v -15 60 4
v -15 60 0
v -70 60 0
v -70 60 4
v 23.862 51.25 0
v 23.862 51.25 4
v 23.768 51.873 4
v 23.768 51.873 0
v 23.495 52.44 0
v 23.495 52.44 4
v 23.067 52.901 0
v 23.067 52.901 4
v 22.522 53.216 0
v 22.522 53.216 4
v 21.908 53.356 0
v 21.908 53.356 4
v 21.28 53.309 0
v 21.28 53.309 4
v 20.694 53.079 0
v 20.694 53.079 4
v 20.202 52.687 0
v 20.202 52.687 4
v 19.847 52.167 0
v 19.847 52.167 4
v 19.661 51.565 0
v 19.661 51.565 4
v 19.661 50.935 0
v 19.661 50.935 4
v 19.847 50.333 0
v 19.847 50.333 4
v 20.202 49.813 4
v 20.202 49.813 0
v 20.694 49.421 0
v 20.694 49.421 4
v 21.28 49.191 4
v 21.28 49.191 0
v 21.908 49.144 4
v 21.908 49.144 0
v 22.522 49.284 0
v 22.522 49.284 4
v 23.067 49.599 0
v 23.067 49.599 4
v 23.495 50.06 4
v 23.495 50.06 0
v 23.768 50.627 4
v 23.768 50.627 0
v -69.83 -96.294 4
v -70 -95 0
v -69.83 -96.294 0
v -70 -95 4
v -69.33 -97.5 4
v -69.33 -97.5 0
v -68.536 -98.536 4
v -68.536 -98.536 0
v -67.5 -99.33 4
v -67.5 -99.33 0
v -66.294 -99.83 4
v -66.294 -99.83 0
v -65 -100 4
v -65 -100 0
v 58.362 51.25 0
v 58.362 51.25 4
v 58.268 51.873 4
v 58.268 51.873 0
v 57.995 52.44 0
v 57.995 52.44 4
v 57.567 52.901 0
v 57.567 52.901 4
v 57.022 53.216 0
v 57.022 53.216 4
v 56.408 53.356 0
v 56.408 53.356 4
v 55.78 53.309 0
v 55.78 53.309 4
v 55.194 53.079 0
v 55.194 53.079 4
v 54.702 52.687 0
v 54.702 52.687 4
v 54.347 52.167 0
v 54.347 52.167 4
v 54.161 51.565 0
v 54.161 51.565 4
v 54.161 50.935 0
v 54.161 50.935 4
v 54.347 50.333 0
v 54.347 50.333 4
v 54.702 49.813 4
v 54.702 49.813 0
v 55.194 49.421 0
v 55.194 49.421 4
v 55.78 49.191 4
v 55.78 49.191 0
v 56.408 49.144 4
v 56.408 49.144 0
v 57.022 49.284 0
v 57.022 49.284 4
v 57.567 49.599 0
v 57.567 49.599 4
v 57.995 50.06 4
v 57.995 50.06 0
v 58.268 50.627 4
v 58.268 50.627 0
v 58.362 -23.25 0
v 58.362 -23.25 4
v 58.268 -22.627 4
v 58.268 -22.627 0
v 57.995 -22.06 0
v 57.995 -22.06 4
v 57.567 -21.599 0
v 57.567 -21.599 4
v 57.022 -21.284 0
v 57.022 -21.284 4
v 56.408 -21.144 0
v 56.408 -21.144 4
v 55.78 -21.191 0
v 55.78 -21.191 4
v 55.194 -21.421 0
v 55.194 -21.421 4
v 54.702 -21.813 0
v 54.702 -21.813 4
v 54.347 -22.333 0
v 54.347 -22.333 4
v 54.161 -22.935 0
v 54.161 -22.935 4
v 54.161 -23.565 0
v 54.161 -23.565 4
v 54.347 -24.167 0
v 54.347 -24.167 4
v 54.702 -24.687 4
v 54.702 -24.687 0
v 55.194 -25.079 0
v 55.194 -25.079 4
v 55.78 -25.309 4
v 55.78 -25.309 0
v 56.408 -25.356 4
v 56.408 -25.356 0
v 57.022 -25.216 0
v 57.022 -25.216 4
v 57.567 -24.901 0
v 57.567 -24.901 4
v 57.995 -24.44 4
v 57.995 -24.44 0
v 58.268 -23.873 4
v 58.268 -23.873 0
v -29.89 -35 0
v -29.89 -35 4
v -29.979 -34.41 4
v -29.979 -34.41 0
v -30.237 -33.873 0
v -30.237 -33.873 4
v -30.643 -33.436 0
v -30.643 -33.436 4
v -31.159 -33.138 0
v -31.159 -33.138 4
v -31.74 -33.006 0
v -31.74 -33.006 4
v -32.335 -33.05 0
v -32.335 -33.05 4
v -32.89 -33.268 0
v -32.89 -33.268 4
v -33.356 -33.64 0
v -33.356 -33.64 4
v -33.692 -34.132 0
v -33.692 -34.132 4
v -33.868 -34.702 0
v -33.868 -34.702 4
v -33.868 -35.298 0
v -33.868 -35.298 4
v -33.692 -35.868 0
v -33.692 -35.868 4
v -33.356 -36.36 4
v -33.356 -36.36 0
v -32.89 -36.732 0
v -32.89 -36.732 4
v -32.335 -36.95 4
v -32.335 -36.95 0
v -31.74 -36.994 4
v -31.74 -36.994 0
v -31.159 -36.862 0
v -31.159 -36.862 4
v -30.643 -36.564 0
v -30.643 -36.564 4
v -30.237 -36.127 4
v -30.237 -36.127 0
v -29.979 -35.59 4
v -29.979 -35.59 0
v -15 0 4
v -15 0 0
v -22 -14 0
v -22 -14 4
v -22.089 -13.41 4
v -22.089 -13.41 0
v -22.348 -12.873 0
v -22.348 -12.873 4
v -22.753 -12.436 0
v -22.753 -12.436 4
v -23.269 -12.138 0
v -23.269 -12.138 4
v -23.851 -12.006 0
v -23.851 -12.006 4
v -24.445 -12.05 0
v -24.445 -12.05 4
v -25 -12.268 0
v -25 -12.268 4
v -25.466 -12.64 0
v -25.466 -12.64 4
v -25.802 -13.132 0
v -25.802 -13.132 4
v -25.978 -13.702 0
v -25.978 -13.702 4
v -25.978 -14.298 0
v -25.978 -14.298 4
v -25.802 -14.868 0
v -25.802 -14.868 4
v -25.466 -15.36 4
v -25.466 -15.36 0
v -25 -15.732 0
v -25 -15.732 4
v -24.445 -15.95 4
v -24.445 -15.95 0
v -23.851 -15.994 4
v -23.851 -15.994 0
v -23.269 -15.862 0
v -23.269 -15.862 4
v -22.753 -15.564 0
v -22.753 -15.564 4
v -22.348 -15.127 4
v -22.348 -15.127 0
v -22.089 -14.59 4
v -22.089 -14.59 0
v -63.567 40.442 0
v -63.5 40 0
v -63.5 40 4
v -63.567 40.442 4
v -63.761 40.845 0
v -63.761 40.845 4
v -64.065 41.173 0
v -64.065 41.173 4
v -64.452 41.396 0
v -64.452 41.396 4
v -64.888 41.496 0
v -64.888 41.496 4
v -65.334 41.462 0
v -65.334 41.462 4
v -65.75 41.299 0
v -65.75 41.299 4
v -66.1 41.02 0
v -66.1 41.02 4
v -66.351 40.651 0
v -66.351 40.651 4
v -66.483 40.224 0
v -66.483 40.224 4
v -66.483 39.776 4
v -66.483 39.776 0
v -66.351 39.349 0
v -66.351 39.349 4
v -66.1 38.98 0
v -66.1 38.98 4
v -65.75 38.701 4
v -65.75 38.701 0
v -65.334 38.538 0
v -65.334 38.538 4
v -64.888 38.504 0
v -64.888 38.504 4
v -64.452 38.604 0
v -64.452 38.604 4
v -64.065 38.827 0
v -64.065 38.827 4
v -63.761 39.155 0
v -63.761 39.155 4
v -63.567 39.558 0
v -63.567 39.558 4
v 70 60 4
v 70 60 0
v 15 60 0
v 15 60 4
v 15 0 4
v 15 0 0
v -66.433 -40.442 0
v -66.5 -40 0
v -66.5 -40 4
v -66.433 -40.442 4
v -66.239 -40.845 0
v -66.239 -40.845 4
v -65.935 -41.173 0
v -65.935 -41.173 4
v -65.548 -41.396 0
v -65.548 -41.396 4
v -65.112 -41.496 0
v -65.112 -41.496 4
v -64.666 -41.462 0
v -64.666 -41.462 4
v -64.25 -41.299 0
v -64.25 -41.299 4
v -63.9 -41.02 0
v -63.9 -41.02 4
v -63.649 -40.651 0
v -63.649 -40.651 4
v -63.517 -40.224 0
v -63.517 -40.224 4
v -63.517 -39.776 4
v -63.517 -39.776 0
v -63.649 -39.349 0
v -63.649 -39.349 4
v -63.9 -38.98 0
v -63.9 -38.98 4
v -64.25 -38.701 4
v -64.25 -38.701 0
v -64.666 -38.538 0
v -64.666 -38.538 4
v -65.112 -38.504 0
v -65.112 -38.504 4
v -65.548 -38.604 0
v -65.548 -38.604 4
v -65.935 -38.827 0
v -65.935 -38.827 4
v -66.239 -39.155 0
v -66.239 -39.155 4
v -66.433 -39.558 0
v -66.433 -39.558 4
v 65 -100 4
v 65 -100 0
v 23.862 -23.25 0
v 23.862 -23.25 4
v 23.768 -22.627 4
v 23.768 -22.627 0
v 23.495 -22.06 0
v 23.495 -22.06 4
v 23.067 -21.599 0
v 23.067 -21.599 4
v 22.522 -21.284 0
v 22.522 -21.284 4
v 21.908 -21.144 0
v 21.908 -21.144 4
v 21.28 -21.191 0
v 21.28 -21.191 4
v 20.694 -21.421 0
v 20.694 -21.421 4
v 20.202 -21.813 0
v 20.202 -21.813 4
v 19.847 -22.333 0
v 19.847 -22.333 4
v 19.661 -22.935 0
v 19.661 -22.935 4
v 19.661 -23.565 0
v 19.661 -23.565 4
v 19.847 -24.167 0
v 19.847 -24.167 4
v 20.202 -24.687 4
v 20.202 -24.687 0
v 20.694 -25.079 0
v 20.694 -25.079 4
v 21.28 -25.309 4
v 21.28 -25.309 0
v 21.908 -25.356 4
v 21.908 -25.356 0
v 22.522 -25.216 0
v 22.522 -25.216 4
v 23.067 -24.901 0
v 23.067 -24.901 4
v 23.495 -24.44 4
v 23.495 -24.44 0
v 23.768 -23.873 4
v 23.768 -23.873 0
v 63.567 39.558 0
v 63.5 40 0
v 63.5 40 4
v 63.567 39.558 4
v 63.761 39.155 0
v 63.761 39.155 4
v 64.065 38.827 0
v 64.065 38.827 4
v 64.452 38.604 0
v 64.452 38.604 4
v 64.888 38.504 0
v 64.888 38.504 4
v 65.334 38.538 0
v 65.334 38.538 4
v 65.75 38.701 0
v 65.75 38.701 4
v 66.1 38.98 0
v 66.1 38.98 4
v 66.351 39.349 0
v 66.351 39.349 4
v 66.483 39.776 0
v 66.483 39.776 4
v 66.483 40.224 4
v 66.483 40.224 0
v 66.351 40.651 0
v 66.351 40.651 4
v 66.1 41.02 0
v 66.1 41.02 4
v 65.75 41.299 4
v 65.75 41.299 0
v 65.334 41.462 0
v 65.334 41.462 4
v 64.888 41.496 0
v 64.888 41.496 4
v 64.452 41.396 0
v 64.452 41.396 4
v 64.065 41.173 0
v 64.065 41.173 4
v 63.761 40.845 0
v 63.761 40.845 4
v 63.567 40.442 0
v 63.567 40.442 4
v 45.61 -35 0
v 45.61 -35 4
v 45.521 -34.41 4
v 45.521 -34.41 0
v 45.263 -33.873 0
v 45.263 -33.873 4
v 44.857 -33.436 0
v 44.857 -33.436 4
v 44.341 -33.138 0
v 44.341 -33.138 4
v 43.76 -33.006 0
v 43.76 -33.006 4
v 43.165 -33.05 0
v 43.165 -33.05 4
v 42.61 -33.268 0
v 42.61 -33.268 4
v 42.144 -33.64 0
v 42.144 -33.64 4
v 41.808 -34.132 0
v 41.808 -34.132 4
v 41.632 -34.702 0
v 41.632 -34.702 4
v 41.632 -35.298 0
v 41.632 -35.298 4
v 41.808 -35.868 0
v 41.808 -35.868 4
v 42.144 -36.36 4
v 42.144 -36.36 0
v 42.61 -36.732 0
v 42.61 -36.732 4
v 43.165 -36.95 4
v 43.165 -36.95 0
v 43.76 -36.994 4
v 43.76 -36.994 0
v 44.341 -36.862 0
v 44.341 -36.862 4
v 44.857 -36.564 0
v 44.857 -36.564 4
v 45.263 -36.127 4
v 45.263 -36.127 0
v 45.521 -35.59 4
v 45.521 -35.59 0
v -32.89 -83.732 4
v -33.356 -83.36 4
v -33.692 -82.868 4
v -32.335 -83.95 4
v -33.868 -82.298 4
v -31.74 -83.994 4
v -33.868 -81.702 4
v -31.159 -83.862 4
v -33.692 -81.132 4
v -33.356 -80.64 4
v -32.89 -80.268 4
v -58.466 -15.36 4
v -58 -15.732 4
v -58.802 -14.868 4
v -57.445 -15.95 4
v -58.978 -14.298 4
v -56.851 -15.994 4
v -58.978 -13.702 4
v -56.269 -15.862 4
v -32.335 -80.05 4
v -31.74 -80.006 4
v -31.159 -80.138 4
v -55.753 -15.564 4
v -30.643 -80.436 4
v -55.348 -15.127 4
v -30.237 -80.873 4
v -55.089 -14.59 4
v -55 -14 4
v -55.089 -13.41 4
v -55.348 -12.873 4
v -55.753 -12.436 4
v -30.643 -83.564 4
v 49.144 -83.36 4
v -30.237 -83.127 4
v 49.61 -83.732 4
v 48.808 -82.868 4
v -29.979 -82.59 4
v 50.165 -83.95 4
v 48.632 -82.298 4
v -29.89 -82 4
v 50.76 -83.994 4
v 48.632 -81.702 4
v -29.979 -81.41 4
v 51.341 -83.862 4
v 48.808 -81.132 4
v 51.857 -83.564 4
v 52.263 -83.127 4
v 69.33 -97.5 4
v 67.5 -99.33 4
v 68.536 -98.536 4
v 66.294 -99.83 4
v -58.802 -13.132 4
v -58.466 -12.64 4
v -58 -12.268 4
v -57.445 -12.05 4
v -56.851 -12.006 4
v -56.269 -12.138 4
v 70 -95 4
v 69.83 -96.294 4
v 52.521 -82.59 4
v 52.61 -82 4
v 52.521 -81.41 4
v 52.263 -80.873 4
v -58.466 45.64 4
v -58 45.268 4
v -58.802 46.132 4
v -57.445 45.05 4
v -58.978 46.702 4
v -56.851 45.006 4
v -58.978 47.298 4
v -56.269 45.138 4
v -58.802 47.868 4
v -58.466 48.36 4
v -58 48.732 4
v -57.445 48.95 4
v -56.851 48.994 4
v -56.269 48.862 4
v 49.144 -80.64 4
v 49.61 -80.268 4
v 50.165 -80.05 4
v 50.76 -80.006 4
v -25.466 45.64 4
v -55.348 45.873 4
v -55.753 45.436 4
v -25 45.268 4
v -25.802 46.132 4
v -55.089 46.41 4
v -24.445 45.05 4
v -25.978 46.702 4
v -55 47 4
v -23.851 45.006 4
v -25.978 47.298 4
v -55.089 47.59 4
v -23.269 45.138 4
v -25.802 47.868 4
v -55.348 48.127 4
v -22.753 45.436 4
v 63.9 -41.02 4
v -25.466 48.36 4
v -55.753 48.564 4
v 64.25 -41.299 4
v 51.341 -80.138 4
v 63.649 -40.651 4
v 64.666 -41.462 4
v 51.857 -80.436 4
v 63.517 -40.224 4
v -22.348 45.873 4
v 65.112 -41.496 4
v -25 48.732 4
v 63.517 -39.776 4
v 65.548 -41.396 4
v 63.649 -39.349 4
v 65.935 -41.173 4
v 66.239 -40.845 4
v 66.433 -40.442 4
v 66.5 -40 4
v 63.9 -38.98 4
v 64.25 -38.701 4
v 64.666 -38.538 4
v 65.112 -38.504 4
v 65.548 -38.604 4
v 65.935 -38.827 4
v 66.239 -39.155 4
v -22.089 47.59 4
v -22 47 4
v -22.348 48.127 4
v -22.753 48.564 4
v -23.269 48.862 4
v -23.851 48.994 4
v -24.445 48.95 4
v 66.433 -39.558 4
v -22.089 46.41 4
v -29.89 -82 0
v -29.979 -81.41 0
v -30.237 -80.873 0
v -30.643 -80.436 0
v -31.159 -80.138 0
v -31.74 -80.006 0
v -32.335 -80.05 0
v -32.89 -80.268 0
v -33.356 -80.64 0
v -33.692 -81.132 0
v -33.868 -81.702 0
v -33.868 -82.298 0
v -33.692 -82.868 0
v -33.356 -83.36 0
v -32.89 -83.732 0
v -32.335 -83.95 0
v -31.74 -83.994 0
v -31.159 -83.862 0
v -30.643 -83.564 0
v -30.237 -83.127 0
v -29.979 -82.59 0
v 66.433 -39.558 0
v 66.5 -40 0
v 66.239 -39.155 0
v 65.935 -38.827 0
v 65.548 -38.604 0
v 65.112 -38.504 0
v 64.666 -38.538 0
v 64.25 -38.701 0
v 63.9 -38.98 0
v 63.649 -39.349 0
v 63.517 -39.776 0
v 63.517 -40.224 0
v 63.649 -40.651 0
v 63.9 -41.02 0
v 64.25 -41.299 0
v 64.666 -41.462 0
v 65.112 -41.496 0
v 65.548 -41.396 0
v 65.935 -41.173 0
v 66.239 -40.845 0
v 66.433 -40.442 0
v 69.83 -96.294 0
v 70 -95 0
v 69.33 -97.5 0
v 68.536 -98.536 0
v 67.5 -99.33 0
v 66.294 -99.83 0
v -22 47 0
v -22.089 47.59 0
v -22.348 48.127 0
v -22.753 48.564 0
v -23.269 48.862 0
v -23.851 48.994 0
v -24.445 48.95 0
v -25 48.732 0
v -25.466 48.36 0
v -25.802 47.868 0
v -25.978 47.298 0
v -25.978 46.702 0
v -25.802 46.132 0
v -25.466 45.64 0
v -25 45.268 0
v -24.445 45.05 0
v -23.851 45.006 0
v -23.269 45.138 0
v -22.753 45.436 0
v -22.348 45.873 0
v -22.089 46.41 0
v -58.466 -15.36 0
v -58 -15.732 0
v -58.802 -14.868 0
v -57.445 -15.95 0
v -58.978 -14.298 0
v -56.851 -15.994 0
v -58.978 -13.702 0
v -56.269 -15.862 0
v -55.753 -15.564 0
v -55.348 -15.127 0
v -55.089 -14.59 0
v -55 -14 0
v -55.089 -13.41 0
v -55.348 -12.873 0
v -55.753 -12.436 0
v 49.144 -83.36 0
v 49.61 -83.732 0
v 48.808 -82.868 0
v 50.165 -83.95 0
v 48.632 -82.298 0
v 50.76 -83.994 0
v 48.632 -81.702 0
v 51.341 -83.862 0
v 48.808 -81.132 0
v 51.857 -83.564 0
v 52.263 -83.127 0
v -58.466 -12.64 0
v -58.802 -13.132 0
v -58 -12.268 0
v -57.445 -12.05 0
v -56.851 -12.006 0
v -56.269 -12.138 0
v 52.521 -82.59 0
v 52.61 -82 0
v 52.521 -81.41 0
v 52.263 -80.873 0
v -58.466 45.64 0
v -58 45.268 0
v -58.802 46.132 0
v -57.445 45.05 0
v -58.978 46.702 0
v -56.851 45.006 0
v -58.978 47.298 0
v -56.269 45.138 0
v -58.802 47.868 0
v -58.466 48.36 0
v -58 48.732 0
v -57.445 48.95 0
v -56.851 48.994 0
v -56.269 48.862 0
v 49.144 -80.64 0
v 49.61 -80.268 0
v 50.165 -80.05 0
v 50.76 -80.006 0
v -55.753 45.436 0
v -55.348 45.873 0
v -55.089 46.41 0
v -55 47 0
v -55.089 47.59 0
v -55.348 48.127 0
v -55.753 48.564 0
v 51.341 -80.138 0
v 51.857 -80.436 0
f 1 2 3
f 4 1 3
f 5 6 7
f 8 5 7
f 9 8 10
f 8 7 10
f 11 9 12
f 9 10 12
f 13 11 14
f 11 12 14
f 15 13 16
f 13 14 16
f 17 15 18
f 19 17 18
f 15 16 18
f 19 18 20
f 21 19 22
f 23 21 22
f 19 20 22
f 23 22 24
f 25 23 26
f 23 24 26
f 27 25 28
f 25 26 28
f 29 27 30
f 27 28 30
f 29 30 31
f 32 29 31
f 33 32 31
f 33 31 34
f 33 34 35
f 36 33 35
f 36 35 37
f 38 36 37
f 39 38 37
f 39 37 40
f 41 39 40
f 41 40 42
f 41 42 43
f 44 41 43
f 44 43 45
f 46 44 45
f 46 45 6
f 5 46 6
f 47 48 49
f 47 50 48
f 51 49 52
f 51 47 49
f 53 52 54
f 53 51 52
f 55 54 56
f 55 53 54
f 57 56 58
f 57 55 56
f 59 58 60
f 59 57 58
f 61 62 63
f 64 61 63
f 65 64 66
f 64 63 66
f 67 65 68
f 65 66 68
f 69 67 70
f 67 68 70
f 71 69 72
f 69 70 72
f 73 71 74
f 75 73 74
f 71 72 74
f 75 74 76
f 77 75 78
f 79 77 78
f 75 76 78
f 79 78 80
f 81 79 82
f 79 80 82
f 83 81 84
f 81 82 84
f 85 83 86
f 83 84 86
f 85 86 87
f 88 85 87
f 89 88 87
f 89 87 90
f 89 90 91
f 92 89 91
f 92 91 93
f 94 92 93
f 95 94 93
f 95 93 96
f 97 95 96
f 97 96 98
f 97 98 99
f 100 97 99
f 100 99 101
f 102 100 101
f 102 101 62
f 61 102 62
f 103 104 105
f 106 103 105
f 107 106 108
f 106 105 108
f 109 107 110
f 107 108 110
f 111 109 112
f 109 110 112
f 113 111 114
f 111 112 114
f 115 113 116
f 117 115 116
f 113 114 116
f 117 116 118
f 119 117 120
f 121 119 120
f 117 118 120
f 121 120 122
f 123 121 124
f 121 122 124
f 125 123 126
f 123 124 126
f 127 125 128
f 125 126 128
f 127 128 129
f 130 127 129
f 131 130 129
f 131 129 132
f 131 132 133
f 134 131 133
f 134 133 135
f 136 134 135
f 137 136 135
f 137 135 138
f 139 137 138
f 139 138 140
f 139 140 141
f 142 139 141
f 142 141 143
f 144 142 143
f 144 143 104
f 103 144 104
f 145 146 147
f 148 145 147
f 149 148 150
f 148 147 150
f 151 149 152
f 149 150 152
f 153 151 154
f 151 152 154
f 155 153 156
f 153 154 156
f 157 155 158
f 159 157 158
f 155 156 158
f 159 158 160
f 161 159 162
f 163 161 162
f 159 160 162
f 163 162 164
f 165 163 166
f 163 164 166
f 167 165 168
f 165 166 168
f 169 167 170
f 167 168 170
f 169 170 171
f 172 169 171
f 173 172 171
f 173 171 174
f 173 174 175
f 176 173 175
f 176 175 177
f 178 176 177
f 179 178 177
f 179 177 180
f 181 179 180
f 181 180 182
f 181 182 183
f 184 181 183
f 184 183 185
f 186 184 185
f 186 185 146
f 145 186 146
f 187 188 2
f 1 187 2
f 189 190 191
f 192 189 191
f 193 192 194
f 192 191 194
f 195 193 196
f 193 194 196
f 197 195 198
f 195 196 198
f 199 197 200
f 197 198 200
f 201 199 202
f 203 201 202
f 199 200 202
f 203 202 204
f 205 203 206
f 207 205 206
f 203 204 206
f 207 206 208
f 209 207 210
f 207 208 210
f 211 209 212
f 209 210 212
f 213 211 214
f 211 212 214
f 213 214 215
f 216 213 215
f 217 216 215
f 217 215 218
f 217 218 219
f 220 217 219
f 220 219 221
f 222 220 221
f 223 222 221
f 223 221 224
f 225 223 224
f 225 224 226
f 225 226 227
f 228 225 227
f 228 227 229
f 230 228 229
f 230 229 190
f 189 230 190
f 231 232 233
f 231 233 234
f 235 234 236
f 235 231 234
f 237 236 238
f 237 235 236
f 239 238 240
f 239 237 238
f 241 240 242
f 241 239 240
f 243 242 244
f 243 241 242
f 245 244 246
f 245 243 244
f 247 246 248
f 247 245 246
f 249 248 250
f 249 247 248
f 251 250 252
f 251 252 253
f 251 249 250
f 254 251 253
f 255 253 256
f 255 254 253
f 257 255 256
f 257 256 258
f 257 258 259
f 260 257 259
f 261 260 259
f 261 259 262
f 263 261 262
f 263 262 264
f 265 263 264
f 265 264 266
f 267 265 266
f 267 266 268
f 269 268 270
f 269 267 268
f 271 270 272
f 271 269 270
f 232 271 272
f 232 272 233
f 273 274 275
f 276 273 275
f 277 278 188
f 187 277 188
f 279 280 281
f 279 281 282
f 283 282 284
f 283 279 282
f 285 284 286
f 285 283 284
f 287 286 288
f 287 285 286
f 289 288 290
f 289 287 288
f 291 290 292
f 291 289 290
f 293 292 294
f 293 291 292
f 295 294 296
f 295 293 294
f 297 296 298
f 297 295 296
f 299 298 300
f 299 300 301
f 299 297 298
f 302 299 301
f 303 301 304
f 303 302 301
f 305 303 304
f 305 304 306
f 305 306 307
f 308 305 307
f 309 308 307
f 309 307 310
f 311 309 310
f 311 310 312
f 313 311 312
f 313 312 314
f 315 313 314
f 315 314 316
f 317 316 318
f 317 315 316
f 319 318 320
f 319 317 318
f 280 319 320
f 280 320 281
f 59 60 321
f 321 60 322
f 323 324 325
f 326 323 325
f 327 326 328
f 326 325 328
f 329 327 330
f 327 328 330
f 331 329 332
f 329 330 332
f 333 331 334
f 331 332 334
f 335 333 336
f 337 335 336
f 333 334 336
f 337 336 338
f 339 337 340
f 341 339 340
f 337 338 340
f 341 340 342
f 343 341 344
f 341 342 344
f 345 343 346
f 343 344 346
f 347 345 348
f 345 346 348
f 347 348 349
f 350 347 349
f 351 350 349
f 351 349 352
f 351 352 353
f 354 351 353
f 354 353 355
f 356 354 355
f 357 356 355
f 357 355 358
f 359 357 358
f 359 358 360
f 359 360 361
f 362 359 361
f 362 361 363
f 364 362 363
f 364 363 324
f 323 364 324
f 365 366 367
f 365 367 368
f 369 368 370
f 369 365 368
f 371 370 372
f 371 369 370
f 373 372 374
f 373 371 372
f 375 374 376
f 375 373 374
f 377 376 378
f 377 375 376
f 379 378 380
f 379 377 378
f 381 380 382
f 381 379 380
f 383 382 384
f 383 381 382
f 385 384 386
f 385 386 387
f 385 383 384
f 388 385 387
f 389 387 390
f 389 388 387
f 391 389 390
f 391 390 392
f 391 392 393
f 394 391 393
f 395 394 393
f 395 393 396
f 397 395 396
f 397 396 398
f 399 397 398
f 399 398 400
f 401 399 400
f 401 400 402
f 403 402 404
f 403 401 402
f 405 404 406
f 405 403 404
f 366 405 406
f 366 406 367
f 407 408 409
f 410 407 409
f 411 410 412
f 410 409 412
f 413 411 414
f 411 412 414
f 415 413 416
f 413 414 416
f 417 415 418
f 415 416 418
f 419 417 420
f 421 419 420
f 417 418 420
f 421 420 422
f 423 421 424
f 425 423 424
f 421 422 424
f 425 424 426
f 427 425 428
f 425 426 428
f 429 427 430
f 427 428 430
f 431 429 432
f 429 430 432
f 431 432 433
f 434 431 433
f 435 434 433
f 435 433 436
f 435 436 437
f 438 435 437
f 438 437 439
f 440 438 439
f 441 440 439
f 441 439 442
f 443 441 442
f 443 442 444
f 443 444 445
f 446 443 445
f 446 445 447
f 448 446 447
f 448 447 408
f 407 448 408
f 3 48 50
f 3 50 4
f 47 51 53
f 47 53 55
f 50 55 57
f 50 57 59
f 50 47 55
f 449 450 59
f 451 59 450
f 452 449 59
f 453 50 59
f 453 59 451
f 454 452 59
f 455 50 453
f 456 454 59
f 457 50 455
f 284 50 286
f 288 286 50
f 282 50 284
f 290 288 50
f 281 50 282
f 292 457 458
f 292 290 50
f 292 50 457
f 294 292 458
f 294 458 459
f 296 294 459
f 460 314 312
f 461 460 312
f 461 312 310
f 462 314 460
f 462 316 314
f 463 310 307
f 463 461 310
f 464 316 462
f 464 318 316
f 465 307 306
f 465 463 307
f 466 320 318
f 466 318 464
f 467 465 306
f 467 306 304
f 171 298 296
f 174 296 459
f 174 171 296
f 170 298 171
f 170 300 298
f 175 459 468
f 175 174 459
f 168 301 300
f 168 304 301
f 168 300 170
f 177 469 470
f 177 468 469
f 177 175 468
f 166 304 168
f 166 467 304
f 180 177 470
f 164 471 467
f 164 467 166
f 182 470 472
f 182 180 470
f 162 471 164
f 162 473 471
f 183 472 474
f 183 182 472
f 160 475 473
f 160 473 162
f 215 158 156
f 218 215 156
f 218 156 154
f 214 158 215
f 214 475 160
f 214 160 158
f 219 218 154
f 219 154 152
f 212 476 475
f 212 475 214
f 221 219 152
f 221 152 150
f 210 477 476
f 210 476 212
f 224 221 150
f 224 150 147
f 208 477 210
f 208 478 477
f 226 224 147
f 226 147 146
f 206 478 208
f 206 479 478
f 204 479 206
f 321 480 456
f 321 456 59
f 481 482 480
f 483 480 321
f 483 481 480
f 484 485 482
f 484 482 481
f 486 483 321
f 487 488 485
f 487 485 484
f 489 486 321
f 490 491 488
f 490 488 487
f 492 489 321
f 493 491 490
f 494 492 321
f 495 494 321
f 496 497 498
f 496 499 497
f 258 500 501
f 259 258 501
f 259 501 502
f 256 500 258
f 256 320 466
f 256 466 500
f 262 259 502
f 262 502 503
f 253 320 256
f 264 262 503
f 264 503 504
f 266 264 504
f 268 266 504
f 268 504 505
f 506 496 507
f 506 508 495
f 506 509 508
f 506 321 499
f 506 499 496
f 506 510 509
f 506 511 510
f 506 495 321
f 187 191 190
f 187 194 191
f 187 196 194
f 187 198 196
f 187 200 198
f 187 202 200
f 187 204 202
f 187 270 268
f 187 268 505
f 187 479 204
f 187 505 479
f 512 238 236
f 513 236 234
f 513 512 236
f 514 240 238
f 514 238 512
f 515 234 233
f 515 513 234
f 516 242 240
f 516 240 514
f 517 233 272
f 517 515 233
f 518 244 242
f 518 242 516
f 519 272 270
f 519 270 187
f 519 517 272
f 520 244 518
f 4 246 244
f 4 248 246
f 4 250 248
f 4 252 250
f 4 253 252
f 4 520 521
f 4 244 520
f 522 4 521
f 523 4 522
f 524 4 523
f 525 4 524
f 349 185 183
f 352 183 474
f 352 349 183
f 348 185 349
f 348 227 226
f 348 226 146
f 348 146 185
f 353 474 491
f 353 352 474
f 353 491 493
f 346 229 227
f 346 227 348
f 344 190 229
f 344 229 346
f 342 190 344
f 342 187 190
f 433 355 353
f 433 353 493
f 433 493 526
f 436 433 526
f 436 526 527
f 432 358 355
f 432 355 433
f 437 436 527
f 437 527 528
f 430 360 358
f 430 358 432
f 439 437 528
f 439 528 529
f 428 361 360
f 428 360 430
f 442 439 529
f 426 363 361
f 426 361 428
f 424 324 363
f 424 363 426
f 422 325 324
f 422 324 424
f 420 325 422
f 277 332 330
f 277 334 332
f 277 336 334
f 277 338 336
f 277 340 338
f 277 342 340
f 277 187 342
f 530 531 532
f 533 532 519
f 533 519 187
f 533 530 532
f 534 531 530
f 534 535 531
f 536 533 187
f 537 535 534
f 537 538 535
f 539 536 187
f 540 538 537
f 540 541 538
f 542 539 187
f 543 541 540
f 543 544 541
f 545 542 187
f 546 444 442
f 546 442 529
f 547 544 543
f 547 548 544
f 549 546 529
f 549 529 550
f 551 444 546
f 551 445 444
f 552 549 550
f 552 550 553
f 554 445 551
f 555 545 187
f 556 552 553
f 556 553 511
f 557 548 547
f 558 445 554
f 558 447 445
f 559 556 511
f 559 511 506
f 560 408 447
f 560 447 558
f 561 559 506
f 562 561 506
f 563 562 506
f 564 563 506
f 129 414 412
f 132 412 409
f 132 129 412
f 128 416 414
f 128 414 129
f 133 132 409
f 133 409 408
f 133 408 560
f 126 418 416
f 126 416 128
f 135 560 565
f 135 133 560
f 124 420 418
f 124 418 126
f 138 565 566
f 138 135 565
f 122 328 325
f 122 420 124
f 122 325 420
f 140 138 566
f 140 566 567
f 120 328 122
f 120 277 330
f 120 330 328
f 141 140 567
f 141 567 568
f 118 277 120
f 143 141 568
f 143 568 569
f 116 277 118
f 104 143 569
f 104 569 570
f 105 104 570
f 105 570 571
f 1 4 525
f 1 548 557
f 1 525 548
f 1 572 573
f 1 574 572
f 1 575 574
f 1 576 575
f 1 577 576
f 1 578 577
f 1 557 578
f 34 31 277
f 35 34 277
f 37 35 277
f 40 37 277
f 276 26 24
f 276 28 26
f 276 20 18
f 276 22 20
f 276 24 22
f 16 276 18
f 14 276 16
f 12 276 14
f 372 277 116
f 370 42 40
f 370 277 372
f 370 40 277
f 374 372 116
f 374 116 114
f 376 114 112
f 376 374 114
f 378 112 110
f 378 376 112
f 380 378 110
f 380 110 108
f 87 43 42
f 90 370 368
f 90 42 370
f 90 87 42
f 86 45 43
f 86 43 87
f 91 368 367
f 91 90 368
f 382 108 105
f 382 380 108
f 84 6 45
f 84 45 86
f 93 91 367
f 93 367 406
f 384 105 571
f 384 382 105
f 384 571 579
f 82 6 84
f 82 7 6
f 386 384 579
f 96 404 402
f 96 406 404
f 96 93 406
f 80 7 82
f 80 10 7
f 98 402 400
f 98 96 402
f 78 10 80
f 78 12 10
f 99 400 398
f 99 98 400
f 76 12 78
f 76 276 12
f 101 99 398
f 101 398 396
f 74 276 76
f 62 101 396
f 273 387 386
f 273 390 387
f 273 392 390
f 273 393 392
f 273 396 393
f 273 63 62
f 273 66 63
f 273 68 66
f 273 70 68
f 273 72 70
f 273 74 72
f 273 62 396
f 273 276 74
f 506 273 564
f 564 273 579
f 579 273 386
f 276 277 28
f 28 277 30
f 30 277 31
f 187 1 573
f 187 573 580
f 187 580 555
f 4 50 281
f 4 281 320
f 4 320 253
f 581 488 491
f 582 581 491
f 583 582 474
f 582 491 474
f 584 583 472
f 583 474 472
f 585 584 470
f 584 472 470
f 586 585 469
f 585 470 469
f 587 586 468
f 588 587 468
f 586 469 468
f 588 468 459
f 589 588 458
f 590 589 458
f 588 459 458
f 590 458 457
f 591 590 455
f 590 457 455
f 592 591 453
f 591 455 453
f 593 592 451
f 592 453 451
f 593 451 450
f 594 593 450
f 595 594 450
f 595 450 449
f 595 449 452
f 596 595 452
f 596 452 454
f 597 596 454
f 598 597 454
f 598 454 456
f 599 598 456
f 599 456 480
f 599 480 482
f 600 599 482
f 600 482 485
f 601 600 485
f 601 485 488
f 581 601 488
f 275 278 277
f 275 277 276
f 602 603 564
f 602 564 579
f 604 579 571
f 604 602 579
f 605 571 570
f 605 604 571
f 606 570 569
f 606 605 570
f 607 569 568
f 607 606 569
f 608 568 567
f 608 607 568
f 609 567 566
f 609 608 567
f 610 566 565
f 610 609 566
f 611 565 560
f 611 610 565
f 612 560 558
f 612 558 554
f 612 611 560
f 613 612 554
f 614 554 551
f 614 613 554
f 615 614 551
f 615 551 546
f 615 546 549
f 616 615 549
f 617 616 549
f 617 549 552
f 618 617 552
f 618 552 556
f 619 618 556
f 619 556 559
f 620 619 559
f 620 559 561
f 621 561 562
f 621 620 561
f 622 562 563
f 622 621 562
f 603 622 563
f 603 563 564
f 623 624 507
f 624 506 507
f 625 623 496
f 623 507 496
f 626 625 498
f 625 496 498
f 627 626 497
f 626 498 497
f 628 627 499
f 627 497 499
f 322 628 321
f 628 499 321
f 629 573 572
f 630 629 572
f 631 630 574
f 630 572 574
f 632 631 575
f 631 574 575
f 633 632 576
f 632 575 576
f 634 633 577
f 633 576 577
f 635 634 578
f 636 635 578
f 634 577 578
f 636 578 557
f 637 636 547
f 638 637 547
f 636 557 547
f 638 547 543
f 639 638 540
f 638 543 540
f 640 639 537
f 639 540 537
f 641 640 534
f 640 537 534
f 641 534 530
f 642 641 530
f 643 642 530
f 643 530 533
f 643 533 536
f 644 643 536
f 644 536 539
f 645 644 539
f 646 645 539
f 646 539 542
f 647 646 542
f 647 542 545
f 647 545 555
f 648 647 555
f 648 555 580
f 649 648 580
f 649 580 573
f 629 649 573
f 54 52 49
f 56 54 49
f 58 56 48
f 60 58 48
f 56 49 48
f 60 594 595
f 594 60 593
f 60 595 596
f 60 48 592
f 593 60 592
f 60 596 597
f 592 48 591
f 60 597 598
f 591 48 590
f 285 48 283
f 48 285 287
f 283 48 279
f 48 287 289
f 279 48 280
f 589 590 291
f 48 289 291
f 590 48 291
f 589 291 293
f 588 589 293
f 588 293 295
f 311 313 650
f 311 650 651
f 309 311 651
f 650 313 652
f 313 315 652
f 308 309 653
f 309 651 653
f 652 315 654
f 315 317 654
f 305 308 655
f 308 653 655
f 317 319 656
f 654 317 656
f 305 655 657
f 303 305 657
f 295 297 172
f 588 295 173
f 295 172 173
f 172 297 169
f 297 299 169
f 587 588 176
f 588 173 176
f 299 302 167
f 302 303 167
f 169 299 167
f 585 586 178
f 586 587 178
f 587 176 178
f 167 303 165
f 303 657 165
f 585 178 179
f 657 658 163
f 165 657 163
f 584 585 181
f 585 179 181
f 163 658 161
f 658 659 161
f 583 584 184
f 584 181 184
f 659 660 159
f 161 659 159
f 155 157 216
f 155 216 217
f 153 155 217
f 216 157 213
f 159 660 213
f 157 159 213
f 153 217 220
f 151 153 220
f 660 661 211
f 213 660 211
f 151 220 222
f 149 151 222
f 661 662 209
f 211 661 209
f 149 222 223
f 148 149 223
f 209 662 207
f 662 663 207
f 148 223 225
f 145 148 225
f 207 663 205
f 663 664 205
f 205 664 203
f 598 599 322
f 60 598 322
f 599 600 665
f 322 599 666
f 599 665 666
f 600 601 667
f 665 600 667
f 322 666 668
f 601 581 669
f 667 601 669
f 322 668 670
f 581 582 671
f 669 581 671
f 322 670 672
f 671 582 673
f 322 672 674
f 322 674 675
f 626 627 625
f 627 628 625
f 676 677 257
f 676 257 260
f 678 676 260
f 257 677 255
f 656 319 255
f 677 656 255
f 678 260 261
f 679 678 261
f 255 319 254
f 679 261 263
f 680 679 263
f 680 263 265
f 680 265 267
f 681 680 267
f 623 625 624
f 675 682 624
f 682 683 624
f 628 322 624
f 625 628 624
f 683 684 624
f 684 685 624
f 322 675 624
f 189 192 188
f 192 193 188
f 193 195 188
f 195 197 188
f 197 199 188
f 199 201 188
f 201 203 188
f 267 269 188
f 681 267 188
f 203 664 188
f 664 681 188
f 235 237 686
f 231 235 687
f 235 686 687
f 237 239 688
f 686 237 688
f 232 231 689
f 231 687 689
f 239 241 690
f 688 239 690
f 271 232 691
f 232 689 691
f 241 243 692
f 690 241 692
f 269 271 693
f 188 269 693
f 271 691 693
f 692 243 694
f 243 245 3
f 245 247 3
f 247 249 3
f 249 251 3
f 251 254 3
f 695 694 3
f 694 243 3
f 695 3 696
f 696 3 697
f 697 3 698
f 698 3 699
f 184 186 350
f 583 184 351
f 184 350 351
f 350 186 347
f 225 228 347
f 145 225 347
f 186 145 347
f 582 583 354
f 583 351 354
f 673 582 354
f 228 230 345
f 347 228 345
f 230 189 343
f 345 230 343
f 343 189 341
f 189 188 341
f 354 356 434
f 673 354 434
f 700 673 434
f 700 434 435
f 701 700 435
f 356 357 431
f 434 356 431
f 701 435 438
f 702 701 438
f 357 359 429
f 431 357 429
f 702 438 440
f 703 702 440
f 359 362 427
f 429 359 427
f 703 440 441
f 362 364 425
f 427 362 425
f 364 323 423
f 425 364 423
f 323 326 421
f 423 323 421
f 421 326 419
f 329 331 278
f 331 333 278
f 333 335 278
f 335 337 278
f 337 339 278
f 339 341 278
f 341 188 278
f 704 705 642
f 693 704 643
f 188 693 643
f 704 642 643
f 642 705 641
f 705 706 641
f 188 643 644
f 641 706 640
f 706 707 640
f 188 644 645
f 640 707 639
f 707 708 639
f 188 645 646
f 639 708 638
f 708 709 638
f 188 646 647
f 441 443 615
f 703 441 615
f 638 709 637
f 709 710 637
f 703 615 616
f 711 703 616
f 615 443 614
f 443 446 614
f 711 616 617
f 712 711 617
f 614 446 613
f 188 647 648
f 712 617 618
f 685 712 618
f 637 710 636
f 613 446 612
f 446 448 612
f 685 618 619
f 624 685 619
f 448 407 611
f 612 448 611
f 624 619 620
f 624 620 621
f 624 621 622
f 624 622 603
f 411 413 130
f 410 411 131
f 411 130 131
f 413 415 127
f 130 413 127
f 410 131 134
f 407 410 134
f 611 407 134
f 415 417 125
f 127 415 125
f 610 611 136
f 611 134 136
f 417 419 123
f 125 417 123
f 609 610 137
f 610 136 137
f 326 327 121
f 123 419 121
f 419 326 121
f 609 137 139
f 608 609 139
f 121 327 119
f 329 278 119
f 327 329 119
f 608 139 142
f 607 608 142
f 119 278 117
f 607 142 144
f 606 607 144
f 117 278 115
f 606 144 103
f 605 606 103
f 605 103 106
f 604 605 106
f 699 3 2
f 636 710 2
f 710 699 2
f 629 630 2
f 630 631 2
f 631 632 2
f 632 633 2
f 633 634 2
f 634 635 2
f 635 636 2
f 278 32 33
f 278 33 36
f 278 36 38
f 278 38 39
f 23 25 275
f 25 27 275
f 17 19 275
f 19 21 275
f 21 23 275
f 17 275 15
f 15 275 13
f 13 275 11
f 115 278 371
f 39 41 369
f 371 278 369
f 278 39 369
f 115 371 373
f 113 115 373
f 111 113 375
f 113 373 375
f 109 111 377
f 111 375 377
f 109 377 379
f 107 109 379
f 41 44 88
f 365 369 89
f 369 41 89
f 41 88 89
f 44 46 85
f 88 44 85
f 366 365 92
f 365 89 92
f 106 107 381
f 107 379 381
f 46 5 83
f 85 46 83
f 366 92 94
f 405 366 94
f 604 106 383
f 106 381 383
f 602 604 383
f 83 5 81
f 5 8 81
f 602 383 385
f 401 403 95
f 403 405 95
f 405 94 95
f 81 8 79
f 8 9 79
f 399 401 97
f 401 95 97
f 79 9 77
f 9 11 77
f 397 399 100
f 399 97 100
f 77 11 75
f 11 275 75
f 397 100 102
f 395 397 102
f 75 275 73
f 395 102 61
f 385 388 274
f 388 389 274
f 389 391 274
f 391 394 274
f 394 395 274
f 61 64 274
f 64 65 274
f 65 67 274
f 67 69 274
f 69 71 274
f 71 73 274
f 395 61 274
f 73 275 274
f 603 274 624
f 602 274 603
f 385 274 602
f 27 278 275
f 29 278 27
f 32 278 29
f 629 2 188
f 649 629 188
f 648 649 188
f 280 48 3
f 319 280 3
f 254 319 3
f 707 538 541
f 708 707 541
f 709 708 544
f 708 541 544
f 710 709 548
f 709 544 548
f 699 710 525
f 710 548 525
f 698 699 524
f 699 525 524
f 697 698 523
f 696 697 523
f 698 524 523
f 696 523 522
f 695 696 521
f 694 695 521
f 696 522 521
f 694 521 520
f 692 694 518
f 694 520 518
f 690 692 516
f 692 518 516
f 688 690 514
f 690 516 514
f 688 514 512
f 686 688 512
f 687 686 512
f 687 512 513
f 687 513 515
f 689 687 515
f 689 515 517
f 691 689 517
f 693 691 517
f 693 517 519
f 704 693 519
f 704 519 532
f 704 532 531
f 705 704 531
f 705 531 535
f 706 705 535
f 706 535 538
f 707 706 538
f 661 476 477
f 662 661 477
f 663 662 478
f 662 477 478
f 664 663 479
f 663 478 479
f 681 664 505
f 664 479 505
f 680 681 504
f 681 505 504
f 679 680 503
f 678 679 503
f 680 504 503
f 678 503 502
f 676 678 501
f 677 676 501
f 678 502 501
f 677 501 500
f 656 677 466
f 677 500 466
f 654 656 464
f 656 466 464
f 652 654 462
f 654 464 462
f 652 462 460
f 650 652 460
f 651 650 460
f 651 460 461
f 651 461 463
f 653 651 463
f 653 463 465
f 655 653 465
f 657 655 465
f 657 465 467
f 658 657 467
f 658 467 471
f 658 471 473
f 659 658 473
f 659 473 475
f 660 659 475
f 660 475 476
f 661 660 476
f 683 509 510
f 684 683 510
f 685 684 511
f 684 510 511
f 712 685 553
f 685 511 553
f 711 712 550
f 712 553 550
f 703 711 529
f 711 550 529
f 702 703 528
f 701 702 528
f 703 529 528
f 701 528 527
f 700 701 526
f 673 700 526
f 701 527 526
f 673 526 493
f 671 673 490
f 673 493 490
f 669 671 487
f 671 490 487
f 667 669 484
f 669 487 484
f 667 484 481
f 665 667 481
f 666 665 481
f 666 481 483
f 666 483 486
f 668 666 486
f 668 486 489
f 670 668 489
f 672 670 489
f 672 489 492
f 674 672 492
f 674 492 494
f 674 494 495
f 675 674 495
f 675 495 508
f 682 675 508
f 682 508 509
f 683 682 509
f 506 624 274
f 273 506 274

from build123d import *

# Parameters (mm, degrees)
SKETCH_1_W             = 140
SKETCH_1_H             = 200
SKETCH_1_R             = 1.5
EXTRUDE_1_DEPTH        = 4
SKETCH_2_W             = 20
SKETCH_2_H             = 20
EXTRUDE_2_DEPTH        = 4
FILLET_1_R             = 3
FILLET_1_OF_MIRROR_1_R = 3
SKETCH_3_W             = 8
SKETCH_3_H             = 30
SKETCH_3_R             = 1.75
EXTRUDE_3_DEPTH        = 4
FILLET_2_R             = 3
FILLET_2_OF_MIRROR_2_R = 3
FILLET_3_R             = 5
EXTRUDE_4_DEPTH        = 4
SKETCH_5_R             = 1.75
CUT_EXTRUDE_1_DEPTH    = 10
SKETCH_6_W             = 30
SKETCH_6_H             = 60
CUT_EXTRUDE_2_DEPTH    = 10
SKETCH_7_R             = 2.112337694
SKETCH_7_R_2           = 2
CUT_EXTRUDE_3_DEPTH    = 10


with BuildPart() as part:
    # 草图1 → 凸台-拉伸1 (new body)
    with BuildSketch(Plane.XY):
        Rectangle(SKETCH_1_W, SKETCH_1_H)
        with Locations((-65, 40)):
            Circle(SKETCH_1_R, mode=Mode.SUBTRACT)
        with Locations(Location((-65, -40, 0), (0, 0, 180))):
            Circle(SKETCH_1_R, mode=Mode.SUBTRACT)
        with Locations((65, -40)):
            Circle(SKETCH_1_R, mode=Mode.SUBTRACT)
        with Locations(Location((65, 40, 0), (0, 0, 180))):
            Circle(SKETCH_1_R, mode=Mode.SUBTRACT)
    extrude(amount=EXTRUDE_1_DEPTH)

    # 草图2 → 凸台-拉伸2 (add)
    with BuildSketch(Plane.XY.offset(4)):
        with Locations((80, 90)):
            Rectangle(SKETCH_2_W, SKETCH_2_H)
    extrude_2 = extrude(amount=-EXTRUDE_2_DEPTH)

    # 圆角1
    fillet_1_edges = [part.edges().sort_by_distance(p)[0] for p in [
        (90, 100, 2),
        (90, 80, 2),
    ]]
    fillet(fillet_1_edges, radius=FILLET_1_R)

    # 镜向1: 凸台-拉伸2 across plane
    add(extrude_2.mirror(Plane(origin=(0, 0, 0), x_dir=(0, 0, 1), z_dir=(1, 0, 0))))

    # 圆角1 of 镜向1
    fillet_1_of_mirror_1_edges = [part.edges().sort_by_distance(p)[0] for p in [
        (-90, 100, 2),
        (-90, 80, 2),
    ]]
    fillet(fillet_1_of_mirror_1_edges, radius=FILLET_1_OF_MIRROR_1_R)

    # 草图3 → 凸台-拉伸3 (add)
    with BuildSketch(Plane.XY.offset(4)):
        with Locations((-66, 115)):
            Rectangle(SKETCH_3_W, SKETCH_3_H)
        with Locations((-66, 126)):
            Circle(SKETCH_3_R, mode=Mode.SUBTRACT)
    extrude_3 = extrude(amount=-EXTRUDE_3_DEPTH)

    # 圆角2
    fillet_2_edges = [part.edges().sort_by_distance(p)[0] for p in [
        (-70, 100, 2),
        (-62, 100, 2),
    ]]
    fillet(fillet_2_edges, radius=FILLET_2_R)

    # 镜向2: 凸台-拉伸3 across plane
    add(extrude_3.mirror(Plane(origin=(0, 0, 0), x_dir=(0, 0, 1), z_dir=(1, 0, 0))))

    # 圆角2 of 镜向2
    fillet_2_of_mirror_2_edges = [part.edges().sort_by_distance(p)[0] for p in [
        (70, 100, 2),
        (62, 100, 2),
    ]]
    fillet(fillet_2_of_mirror_2_edges, radius=FILLET_2_OF_MIRROR_2_R)

    # 圆角3
    fillet_3_edges = [part.edges().sort_by_distance(p)[0] for p in [
        (-70, -100, 2),
        (70, -100, 2),
    ]]
    fillet(fillet_3_edges, radius=FILLET_3_R)

    # 草图4 → 凸台-拉伸4 (add)
    with BuildSketch(Plane(origin=(0, 0, 0), x_dir=(-1, 0, 0), z_dir=(0, 0, -1))):
        with BuildLine():
            add(Edge.make_bspline(
                [(-33.786379938, 100), (-33.384771108, 111.24314249), (-38.944167614, 121.897129031), (-48.25387443, 128.002822688)],
                knots=[0, 0, 0, 0, 0.66194058, 0.66194058, 0.66194058, 0.66194058], degree=3))
            Line((-33.786379938, 100), (0, 100))
            ThreePointArc((0, 100), (-9.331566745, 102.310402433), (-16.507166038, 108.707813791))
            ThreePointArc((-16.507166038, 108.707813791), (-29.663945789, 122.555538901), (-46.506293223, 131.566403293))
            ThreePointArc((-46.506293223, 131.566403293), (-48.952735362, 130.555841868), (-48.25387443, 128.002822688))
        make_face()
        with BuildLine():
            ThreePointArc((16.507166038, 108.707813791), (9.331566745, 102.310402433), (0, 100))
            Line((0, 100), (33.786379938, 100))
            add(Edge.make_bspline(
                [(33.786379938, 100), (33.384771108, 111.24314249), (38.944167614, 121.897129031), (48.25387443, 128.002822688)],
                knots=[0, 0, 0, 0, 0.66194058, 0.66194058, 0.66194058, 0.66194058], degree=3))
            ThreePointArc((48.25387443, 128.002822688), (48.952735362, 130.555841868), (46.506293223, 131.566403293))
            ThreePointArc((46.506293223, 131.566403293), (29.663945789, 122.555538901), (16.507166038, 108.707813791))
        make_face()
    extrude(amount=-EXTRUDE_4_DEPTH)

    # 草图5 → 切除-拉伸1 (cut)
    with BuildSketch(Plane(origin=(0, 0, 0), x_dir=(-1, 0, 0), z_dir=(0, 0, -1))):
        with BuildLine():
            Line((-70, 80), (-70, 60))
            Line((-70, 60), (70, 60))
            Line((70, 60), (70, 80))
            Line((70, 80), (87, 80))
            ThreePointArc((87, 80), (89.121320344, 80.878679656), (90, 83))
            Line((90, 83), (90, 97))
            ThreePointArc((90, 97), (89.121320344, 99.121320344), (87, 100))
            Line((87, 100), (73, 100))
            ThreePointArc((73, 100), (70.878679656, 100.878679656), (70, 103))
            Line((70, 103), (70, 130))
            Line((70, 130), (62, 130))
            Line((62, 130), (62, 103))
            ThreePointArc((62, 103), (61.121320344, 100.878679656), (59, 100))
            Line((59, 100), (33.786379938, 100))
            add(Edge.make_bspline(
                [(33.786379938, 100), (33.384771108, 111.24314249), (38.944167614, 121.897129031), (48.25387443, 128.002822688)],
                knots=[0, 0, 0, 0, 0.66194058, 0.66194058, 0.66194058, 0.66194058], degree=3))
            ThreePointArc((48.25387443, 128.002822688), (48.952735362, 130.555841868), (46.506293223, 131.566403293))
            ThreePointArc((46.506293223, 131.566403293), (29.663945789, 122.555538901), (16.507166038, 108.707813791))
            ThreePointArc((16.507166038, 108.707813791), (0, 100), (-16.507166038, 108.707813791))
            ThreePointArc((-16.507166038, 108.707813791), (-29.663945789, 122.555538901), (-46.506293223, 131.566403293))
            ThreePointArc((-46.506293223, 131.566403293), (-48.952735362, 130.555841868), (-48.25387443, 128.002822688))
            add(Edge.make_bspline(
                [(-48.25387443, 128.002822688), (-38.944167614, 121.897129031), (-33.384771108, 111.24314249), (-33.786379938, 100)],
                knots=[0, 0, 0, 0, 0.66194058, 0.66194058, 0.66194058, 0.66194058], degree=3))
            Line((-33.786379938, 100), (-59, 100))
            ThreePointArc((-59, 100), (-61.121320344, 100.878679656), (-62, 103))
            Line((-62, 103), (-62, 130))
            Line((-62, 130), (-70, 130))
            Line((-70, 130), (-70, 103))
            ThreePointArc((-70, 103), (-70.878679656, 100.878679656), (-73, 100))
            Line((-73, 100), (-87, 100))
            ThreePointArc((-87, 100), (-89.121320344, 99.121320344), (-90, 97))
            Line((-90, 97), (-90, 83))
            ThreePointArc((-90, 83), (-89.121320344, 80.878679656), (-87, 80))
            Line((-87, 80), (-70, 80))
        make_face()
        with Locations((-66, 126)):
            Circle(SKETCH_5_R, mode=Mode.SUBTRACT)
        with Locations((66, 126)):
            Circle(SKETCH_5_R, mode=Mode.SUBTRACT)
    extrude(amount=-CUT_EXTRUDE_1_DEPTH, mode=Mode.SUBTRACT)

    # 草图6 → 切除-拉伸2 (cut)
    with BuildSketch(Plane(origin=(0, 0, 0), x_dir=(-1, 0, 0), z_dir=(0, 0, -1))):
        with Locations((0, 30)):
            Rectangle(SKETCH_6_W, SKETCH_6_H)
    extrude(amount=-CUT_EXTRUDE_2_DEPTH, mode=Mode.SUBTRACT)

    # 草图7 → 切除-拉伸3 (cut)
    with BuildSketch(Plane.XY.offset(4)):
        with Locations((56.25, 51.25)):
            Circle(SKETCH_7_R)
        with Locations((56.25, -23.25)):
            Circle(SKETCH_7_R)
        with Locations((21.75, 51.25)):
            Circle(SKETCH_7_R)
        with Locations((21.75, -23.25)):
            Circle(SKETCH_7_R)
        with Locations((43.610044526, -35)):
            Circle(SKETCH_7_R_2)
        with Locations((50.610044526, -82)):
            Circle(SKETCH_7_R_2)
        with Locations((-31.889955474, -35)):
            Circle(SKETCH_7_R_2)
        with Locations((-31.889955474, -82)):
            Circle(SKETCH_7_R_2)
        with Locations((-24, 47)):
            Circle(SKETCH_7_R_2)
        with Locations((-57, 47)):
            Circle(SKETCH_7_R_2)
        with Locations((-24, -14)):
            Circle(SKETCH_7_R_2)
        with Locations((-57, -14)):
            Circle(SKETCH_7_R_2)
    extrude(amount=-CUT_EXTRUDE_3_DEPTH, mode=Mode.SUBTRACT)


solid = part.part
